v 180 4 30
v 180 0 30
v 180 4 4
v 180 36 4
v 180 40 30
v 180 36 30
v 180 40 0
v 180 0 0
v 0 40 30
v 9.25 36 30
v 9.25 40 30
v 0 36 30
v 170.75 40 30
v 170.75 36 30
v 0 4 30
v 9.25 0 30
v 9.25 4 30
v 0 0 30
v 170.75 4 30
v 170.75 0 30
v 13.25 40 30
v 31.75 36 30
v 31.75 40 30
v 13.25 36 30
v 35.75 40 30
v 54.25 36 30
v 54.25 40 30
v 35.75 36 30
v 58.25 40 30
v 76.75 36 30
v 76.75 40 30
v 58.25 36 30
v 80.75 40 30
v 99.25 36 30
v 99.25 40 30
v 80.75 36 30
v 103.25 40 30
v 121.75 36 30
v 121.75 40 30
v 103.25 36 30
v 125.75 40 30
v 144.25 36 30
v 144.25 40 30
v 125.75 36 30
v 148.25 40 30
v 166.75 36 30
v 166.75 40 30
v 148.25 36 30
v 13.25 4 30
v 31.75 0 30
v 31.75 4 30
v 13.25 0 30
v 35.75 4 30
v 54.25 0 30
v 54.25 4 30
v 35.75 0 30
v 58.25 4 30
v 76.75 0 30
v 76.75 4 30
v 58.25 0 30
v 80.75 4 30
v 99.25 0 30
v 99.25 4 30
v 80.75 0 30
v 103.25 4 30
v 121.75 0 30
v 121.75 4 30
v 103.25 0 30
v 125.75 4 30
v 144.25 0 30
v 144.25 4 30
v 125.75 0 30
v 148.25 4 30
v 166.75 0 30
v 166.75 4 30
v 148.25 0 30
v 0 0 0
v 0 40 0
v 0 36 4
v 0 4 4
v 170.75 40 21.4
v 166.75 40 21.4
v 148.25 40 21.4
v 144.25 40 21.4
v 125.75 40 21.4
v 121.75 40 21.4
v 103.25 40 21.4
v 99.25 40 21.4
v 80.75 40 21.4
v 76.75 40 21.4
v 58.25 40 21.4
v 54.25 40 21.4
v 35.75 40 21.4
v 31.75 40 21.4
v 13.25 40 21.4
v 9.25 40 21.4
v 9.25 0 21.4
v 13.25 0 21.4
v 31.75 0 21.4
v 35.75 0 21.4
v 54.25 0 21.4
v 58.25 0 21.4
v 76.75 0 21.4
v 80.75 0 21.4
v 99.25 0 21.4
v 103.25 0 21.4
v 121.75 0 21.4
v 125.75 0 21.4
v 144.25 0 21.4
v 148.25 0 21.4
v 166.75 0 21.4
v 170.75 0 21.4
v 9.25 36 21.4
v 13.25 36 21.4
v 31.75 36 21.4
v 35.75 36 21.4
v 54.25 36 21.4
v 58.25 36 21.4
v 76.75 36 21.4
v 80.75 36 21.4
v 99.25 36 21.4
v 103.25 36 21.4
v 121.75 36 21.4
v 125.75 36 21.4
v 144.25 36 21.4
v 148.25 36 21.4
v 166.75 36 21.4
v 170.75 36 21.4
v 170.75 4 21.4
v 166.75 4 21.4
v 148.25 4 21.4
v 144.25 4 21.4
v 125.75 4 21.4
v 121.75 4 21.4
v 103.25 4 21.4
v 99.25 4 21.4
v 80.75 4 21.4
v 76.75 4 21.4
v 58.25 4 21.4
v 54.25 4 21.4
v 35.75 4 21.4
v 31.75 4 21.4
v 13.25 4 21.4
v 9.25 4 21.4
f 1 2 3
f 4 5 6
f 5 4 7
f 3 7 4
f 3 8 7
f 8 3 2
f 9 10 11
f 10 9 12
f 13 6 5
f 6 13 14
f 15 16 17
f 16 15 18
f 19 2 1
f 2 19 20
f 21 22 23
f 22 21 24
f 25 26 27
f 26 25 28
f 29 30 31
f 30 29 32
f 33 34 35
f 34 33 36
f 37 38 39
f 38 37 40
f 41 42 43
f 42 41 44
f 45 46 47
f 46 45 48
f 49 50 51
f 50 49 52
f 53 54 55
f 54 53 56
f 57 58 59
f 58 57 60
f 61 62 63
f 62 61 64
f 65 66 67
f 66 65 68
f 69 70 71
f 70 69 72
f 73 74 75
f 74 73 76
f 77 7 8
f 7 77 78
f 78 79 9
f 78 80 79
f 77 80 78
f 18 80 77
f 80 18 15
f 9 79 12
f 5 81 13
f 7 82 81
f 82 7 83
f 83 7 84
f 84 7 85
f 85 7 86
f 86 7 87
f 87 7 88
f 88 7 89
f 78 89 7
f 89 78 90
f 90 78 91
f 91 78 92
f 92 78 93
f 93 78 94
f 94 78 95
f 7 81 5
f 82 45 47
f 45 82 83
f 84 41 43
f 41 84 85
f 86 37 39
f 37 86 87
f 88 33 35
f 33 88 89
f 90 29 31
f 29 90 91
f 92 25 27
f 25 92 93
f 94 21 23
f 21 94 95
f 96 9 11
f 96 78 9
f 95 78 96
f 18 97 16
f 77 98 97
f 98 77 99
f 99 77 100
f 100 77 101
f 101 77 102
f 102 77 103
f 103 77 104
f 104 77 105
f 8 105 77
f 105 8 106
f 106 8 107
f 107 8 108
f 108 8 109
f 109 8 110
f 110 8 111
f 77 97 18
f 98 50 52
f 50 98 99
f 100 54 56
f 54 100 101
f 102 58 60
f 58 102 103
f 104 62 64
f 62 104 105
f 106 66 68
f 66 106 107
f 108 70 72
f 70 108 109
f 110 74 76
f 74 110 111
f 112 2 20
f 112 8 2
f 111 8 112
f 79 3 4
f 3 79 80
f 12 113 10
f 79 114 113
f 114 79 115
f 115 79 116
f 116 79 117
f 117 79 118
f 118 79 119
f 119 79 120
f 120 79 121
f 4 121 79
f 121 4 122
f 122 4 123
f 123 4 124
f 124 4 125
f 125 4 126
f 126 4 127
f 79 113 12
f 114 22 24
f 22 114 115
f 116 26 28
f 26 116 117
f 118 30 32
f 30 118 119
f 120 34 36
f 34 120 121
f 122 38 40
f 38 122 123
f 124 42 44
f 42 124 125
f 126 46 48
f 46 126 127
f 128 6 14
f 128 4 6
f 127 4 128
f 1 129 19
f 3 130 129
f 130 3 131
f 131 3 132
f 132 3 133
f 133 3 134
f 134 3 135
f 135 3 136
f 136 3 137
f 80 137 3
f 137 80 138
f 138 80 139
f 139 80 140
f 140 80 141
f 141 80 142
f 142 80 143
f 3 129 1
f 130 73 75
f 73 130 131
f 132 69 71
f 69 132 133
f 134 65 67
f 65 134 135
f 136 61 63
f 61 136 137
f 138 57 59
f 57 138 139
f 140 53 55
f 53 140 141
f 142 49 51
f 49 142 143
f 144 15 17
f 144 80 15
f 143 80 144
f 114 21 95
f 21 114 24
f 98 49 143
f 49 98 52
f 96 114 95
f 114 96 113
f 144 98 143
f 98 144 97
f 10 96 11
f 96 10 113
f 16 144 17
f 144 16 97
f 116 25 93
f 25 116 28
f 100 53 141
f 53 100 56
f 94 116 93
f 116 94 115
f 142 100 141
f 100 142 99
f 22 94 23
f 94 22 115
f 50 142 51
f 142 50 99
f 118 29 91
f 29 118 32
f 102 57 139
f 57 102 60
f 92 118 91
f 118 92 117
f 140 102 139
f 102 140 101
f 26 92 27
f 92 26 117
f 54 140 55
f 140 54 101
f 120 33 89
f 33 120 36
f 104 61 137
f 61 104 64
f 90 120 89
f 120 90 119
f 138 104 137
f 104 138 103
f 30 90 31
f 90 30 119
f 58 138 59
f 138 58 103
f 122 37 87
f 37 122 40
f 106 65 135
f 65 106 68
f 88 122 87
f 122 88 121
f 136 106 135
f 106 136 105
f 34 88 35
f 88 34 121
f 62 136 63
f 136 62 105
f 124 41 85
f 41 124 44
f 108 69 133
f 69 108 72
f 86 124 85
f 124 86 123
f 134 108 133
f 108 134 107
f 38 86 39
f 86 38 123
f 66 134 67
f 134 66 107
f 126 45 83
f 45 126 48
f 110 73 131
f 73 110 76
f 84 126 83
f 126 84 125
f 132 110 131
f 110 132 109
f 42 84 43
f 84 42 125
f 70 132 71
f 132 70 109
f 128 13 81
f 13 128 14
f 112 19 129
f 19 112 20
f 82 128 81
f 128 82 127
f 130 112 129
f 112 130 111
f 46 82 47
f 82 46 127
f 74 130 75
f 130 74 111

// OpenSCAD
$fn = 32;

// ----------------------------------------------------------------------
// Cable duct: 180 x 40 x 30 mm, 8 fingers
// ----------------------------------------------------------------------

// --- parameters (mm) ---
channel_l = 180;          // duct length, X
channel_w = 40;           // duct width, Y
channel_h = 30;           // duct height, Z
channel_t = 4;            // side wall thickness
floor_t = 4;              // floor thickness
slot_w = 4;               // finger slot width
slot_h = 17.4;            // finger slot height
fingers = 8;              // number of finger slots per side
pitch = 22.5;             // finger pitch

module shell() {
  difference() {
    cube([channel_l, channel_w, channel_h]);
    /* open top channel */
    translate([-channel_t - 1, channel_t, floor_t])
      cube([channel_l + 2 * channel_t + 2, channel_w - 2 * channel_t, channel_h + 1]);
  }
}

difference() {
  union() {
    shell();
  }
  /* finger slots cut through both side walls */
  for (i = [0 : fingers - 1]) translate([pitch / 2 + i * pitch - slot_w / 2, -1, floor_t + slot_h]) cube([slot_w, channel_w + 2, channel_h]);
}
